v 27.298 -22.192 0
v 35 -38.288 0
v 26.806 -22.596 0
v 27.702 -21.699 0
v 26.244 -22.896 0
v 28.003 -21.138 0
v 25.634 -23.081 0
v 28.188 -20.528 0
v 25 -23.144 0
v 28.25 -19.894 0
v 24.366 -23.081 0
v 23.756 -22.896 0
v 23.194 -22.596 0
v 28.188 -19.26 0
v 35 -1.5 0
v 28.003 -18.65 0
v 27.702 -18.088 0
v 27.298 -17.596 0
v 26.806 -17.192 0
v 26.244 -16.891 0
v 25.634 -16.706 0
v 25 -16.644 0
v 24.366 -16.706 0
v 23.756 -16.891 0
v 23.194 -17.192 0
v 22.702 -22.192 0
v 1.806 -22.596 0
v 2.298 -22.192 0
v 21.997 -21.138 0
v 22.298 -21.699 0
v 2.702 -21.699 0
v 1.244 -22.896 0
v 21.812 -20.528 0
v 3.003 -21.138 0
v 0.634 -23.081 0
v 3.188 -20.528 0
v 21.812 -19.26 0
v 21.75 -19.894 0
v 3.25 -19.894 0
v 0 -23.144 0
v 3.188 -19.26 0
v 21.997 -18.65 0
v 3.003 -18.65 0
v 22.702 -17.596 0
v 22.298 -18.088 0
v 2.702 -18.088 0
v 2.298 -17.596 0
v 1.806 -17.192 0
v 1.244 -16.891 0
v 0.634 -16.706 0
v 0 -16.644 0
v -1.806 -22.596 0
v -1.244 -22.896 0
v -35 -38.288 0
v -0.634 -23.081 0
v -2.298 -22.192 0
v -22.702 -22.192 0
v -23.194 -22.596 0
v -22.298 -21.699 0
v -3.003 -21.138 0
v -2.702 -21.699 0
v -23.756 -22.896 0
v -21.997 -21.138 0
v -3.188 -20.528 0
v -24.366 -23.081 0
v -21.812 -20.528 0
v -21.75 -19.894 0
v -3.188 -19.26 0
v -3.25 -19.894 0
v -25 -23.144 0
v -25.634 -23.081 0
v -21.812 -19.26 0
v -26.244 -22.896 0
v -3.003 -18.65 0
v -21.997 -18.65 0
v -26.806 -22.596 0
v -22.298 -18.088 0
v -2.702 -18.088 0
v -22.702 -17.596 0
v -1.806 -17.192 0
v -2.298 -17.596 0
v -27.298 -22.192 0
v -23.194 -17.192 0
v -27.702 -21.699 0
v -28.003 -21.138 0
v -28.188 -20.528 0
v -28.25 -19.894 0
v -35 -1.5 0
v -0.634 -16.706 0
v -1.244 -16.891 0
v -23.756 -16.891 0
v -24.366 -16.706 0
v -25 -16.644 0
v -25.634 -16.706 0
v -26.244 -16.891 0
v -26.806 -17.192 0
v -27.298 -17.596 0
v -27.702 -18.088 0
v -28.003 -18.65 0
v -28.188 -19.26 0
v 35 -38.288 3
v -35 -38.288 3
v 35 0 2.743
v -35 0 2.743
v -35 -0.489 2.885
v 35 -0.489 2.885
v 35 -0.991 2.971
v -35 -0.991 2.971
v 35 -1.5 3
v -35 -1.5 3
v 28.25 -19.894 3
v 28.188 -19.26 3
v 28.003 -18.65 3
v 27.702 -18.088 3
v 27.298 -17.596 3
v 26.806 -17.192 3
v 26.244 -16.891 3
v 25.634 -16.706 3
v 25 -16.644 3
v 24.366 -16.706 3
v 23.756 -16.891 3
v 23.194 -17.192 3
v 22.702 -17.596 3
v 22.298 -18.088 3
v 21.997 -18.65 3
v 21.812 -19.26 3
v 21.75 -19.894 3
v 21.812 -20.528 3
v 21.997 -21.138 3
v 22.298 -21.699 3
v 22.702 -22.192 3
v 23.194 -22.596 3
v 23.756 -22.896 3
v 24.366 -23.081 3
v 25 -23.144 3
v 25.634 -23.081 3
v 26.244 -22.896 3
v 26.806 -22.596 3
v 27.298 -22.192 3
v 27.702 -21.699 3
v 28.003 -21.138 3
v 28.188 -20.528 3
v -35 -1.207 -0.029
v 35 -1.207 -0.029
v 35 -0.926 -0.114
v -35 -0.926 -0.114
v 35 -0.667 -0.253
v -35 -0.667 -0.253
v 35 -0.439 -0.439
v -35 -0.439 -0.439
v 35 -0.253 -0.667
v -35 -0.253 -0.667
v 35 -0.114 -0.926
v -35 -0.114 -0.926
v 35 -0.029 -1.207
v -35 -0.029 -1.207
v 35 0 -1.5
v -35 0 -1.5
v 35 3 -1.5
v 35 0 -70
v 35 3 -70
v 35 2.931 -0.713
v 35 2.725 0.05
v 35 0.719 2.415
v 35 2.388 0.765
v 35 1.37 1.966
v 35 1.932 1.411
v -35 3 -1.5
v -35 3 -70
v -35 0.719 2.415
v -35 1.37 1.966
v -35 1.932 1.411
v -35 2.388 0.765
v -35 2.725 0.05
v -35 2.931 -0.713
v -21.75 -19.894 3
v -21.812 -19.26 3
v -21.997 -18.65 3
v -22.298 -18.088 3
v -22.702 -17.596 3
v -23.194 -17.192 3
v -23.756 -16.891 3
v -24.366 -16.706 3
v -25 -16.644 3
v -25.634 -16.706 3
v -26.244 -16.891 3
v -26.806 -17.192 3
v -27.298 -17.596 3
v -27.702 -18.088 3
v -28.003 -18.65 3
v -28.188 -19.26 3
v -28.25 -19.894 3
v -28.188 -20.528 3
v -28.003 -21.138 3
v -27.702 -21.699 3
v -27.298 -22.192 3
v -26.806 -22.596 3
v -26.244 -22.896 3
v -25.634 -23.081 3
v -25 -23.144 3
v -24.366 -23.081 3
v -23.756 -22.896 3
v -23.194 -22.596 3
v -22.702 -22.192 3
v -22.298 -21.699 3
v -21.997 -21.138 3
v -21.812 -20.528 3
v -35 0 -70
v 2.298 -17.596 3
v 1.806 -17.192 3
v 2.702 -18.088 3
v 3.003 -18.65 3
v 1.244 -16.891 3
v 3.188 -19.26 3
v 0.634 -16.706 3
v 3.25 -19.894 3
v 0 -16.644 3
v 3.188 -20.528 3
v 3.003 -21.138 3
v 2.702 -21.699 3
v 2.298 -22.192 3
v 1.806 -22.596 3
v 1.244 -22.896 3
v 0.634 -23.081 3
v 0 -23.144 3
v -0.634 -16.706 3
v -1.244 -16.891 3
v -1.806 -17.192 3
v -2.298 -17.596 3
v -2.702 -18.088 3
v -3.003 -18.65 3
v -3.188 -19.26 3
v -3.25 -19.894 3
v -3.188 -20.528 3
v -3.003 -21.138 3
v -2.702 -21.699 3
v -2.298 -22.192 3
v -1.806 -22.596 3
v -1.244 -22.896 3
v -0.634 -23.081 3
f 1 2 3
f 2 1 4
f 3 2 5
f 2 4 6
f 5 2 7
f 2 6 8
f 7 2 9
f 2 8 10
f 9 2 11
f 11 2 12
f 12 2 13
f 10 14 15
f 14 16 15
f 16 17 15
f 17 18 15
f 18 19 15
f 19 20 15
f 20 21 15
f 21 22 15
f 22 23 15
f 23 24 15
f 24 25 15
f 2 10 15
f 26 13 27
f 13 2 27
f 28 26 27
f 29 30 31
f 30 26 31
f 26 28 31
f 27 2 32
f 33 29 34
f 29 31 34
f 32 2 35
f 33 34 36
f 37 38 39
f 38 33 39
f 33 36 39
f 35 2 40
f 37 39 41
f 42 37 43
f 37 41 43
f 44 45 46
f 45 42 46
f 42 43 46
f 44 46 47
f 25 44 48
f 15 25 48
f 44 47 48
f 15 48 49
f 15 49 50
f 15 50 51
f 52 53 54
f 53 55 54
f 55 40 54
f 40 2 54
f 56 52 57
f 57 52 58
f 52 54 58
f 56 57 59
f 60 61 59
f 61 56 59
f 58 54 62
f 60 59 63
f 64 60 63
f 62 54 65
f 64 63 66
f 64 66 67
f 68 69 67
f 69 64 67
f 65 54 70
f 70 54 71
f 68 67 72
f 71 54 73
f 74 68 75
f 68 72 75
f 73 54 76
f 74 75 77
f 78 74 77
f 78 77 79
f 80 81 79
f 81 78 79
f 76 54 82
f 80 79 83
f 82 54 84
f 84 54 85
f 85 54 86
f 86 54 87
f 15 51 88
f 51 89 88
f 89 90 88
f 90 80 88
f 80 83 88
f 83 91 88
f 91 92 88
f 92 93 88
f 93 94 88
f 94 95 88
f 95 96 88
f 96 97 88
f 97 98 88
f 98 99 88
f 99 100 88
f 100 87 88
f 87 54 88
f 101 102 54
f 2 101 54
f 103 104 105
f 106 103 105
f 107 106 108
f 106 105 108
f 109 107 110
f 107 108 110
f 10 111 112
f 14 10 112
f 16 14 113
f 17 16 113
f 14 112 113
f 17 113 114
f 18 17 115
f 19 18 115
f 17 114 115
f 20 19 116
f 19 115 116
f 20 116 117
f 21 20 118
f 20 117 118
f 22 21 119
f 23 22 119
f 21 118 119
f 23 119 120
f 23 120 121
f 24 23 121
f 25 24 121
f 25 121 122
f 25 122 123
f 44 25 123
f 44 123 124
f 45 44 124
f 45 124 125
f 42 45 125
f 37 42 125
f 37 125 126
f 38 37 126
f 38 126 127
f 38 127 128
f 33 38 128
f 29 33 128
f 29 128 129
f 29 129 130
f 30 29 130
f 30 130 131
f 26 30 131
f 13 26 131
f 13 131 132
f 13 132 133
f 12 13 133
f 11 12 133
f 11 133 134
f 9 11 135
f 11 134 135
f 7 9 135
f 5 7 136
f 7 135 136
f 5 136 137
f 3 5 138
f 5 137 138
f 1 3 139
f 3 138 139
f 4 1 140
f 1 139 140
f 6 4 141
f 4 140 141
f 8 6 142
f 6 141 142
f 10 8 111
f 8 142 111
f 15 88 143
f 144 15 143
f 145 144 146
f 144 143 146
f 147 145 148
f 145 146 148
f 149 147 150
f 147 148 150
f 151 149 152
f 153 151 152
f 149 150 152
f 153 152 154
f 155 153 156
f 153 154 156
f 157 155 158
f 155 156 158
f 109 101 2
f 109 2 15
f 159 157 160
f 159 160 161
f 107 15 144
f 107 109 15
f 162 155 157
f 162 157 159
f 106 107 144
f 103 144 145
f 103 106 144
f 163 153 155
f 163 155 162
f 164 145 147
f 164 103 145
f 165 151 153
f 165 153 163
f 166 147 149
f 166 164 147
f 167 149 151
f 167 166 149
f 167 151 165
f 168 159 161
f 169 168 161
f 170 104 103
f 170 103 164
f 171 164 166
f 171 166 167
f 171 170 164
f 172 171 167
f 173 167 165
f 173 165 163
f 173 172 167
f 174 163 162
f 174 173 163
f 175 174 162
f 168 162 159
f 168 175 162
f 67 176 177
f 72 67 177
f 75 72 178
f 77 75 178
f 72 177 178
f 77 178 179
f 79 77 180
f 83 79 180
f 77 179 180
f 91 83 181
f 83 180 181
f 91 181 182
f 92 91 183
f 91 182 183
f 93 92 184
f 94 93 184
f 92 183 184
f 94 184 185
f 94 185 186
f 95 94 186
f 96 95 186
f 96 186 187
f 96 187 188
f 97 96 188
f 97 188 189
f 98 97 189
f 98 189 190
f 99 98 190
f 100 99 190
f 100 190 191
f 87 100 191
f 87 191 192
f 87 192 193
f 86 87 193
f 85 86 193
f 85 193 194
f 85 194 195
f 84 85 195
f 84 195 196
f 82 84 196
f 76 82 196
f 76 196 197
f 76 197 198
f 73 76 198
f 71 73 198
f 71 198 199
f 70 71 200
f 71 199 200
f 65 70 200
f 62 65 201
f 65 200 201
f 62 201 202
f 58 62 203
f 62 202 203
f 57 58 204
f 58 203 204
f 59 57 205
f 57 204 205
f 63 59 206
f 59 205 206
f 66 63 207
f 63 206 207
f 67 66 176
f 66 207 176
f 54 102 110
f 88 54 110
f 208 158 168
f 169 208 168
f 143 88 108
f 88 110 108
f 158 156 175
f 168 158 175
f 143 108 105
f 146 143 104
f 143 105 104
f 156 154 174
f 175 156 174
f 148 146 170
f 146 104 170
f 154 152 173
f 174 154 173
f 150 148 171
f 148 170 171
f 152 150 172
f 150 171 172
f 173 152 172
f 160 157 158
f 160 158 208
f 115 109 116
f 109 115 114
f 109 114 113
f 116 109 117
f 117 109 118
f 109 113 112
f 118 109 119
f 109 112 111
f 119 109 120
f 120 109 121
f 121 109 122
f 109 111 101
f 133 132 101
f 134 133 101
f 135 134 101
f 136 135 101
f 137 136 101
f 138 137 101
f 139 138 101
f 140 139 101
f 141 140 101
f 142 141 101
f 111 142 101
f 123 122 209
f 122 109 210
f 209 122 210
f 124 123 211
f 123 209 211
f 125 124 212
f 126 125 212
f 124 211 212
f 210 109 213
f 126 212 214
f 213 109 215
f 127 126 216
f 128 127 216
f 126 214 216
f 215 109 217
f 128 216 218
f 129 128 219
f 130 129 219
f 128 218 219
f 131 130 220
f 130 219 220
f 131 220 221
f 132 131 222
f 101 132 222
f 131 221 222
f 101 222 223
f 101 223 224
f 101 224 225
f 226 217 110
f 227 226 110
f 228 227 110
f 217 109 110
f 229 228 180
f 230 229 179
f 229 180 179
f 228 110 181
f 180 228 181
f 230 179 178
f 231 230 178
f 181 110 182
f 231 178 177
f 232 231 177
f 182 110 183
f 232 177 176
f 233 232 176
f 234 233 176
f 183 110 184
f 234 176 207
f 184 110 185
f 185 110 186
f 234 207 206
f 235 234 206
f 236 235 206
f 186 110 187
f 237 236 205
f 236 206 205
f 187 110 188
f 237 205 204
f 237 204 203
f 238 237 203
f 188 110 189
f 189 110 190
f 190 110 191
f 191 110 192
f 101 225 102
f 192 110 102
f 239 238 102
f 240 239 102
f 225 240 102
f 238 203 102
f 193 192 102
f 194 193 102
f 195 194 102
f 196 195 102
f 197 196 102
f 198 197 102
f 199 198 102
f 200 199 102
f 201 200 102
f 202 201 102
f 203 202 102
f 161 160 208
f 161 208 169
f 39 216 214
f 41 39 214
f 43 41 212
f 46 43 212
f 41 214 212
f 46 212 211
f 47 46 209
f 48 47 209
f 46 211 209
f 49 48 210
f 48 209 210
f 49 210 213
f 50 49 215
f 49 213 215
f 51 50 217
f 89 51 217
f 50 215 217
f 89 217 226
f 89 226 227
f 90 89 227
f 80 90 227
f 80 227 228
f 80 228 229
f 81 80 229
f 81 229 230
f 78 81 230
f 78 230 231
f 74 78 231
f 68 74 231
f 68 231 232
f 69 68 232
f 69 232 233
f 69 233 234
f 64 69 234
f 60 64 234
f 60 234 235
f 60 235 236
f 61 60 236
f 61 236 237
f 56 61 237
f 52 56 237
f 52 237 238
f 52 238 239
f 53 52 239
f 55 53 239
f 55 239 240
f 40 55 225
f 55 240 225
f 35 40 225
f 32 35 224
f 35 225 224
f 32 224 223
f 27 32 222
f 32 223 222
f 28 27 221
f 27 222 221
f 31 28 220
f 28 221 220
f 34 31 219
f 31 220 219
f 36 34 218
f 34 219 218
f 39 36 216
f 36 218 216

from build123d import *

# Parameters (mm, degrees)
SKETCH_1_W             = 110
SKETCH_1_H             = 3
SM_BASE_FLANGE_1_DEPTH = 35
OTHER_START            = -35
OTHER_1_DEPTH          = 70
OTHER_1_2_DEPTH        = 70
SKETCH_9_R             = 3.25
CUT_EXTRUDE_3_DEPTH    = 90.55412418


# Read off the part's stored shape, not the designer's step: Нарисованный сгиб1
# Sheet-metal steps are written as plain solids
with BuildPart() as part:
    # Sketch 1 → Базовая кромка1 (new, symmetric)
    with BuildSketch(Plane(origin=(0, 0, 0), x_dir=(0, 0, -1), z_dir=(1, 0, 0))):
        with Locations((15, 1.5)):
            Rectangle(SKETCH_1_W, SKETCH_1_H)
    extrude(amount=SM_BASE_FLANGE_1_DEPTH, both=True)

    # Other 1 outline → Other 1 (cut)
    with BuildSketch(Plane.YZ.offset(OTHER_START)):
        with BuildLine():
            Line((0, 40), (0, 2.742640687))
            ThreePointArc((0, 2.742640687), (2.174234614, 1.098076211), (3, -1.5))
            Line((3, -1.5), (3, 40))
            Line((3, 40), (0, 40))
        make_face()
    extrude(amount=OTHER_1_DEPTH, mode=Mode.SUBTRACT)

    # Other 1 2 outline → Other 1 2 (add)
    with BuildSketch(Plane.YZ.offset(OTHER_START)):
        with BuildLine():
            Line((-1.5, 3), (-38.28761102, 3))
            Line((-38.28761102, 3), (-38.28761102, 0))
            Line((-38.28761102, 0), (-1.5, 0))
            ThreePointArc((-1.5, 0), (-0.439339828, -0.439339828), (0, -1.5))
            Line((0, -1.5), (0, 2.742640687))
            ThreePointArc((0, 2.742640687), (-0.739041096, 2.935193518), (-1.5, 3))
        make_face()
    extrude(amount=OTHER_1_2_DEPTH)

    # Эскиз9 → Вырез-Вытянуть3 (cut, through all)
    with BuildSketch(Plane.XY.offset(3)):
        with Locations((-25, -19.89380551)):
            Circle(SKETCH_9_R)
        with Locations((0, -19.89380551)):
            Circle(SKETCH_9_R)
        with Locations((25, -19.89380551)):
            Circle(SKETCH_9_R)
    extrude(amount=-CUT_EXTRUDE_3_DEPTH, mode=Mode.SUBTRACT)


solid = part.part
